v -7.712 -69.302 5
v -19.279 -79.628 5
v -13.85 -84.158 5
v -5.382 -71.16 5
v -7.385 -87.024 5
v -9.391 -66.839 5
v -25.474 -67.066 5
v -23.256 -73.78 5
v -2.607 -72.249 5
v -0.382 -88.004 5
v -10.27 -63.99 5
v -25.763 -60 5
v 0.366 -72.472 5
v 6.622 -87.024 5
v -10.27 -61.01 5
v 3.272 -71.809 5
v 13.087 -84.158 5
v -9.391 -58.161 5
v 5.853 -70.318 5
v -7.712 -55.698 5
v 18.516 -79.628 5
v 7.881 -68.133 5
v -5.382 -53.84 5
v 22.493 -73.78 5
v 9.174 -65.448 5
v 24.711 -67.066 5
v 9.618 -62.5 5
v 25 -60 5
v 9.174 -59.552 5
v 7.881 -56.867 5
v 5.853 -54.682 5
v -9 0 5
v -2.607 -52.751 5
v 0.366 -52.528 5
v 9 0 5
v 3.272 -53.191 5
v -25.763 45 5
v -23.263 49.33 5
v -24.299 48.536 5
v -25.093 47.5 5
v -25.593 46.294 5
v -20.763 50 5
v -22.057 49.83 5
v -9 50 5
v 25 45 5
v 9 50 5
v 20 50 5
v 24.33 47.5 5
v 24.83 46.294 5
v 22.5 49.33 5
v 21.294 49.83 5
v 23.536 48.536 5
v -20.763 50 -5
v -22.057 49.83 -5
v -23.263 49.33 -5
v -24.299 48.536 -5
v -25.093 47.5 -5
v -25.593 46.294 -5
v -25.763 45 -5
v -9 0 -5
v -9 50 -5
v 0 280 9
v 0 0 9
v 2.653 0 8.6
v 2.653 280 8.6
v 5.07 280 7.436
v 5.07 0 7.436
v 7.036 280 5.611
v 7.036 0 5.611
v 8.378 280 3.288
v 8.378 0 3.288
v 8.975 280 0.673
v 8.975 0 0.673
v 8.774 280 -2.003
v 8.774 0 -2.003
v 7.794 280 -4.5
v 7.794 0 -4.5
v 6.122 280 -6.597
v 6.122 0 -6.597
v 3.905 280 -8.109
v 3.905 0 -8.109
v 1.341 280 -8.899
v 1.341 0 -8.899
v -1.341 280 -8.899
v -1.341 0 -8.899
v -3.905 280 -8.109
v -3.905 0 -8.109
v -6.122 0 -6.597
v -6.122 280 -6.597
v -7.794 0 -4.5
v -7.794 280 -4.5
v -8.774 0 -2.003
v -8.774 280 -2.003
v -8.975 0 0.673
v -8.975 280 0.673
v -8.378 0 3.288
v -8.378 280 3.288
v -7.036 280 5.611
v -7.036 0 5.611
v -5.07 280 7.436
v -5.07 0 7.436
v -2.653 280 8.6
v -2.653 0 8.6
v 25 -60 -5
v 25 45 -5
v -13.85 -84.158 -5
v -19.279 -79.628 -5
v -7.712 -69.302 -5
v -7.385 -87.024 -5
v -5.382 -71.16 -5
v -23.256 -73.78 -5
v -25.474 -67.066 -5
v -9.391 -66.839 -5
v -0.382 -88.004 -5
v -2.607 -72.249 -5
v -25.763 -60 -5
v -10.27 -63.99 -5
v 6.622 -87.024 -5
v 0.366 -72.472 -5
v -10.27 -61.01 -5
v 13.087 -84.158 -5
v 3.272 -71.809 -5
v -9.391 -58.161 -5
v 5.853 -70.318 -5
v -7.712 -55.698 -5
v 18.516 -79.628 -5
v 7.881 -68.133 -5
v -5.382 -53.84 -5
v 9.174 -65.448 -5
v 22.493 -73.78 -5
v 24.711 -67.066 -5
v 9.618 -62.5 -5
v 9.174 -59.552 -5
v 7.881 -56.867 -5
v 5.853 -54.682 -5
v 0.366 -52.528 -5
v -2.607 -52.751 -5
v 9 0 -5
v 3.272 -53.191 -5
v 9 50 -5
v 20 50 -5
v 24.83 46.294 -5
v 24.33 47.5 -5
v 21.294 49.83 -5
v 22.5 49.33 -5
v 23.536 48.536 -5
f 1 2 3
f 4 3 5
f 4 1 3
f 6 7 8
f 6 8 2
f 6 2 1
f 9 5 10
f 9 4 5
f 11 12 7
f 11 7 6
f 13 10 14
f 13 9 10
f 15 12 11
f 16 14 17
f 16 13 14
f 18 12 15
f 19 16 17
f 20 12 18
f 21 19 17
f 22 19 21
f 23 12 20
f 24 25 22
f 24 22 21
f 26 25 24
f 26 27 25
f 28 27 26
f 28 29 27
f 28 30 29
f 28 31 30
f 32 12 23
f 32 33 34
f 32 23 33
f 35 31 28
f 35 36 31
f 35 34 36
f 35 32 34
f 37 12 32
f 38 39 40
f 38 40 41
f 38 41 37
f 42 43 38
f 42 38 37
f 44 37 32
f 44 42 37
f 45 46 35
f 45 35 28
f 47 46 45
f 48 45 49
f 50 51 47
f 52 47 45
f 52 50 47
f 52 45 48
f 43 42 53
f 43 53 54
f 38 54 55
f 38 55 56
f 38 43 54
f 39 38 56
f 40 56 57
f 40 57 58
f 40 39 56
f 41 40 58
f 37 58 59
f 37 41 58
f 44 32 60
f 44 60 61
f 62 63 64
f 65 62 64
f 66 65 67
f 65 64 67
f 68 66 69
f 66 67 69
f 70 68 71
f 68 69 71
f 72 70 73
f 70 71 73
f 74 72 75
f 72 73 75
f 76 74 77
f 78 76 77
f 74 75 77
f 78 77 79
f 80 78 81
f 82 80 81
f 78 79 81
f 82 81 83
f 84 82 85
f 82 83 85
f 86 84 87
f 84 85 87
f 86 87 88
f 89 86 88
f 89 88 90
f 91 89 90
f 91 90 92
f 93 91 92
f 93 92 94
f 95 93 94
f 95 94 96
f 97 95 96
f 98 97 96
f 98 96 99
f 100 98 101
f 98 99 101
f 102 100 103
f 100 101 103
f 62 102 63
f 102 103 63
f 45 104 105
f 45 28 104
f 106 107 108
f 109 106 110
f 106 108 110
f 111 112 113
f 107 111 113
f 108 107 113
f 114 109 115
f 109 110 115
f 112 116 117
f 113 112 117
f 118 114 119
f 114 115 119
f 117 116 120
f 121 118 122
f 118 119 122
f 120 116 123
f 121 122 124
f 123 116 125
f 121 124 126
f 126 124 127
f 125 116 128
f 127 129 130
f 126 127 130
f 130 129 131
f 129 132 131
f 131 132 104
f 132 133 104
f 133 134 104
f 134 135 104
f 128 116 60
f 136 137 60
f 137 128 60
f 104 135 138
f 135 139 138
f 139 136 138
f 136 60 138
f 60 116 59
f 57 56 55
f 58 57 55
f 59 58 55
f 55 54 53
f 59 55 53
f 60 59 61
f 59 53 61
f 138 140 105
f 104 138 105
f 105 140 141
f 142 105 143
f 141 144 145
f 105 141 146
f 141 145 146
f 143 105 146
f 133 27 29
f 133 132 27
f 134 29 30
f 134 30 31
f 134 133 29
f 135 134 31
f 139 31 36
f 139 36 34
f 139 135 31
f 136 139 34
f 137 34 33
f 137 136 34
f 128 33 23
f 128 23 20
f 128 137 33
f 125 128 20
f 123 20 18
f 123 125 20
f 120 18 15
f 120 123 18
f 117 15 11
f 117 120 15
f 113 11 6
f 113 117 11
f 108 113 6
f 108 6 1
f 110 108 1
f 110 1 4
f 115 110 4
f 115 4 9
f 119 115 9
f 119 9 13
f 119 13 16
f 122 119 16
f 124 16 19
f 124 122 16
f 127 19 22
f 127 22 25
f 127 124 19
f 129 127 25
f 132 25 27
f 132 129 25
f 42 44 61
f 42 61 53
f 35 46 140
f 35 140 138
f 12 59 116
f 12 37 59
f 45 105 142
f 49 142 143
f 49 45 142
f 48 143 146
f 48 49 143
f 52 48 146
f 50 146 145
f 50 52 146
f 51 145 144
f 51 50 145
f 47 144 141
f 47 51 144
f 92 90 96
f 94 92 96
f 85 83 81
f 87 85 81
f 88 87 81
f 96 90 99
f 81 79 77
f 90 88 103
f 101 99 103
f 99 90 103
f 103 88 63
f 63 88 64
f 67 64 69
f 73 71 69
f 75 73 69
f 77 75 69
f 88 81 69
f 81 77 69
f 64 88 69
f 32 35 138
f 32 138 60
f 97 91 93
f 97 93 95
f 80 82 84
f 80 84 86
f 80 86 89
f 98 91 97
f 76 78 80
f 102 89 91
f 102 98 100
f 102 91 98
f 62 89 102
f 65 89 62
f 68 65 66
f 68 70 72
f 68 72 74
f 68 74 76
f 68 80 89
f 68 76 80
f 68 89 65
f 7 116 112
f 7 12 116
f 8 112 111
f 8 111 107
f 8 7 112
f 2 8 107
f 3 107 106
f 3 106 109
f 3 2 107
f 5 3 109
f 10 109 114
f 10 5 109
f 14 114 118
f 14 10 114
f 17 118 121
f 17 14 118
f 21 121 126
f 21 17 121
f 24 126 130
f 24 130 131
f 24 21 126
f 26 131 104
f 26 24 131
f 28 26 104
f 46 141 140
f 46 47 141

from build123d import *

# Parameters (mm, degrees)
SKETCH1_R           = 9
BOSS_EXTRUDE1_DEPTH = 280
SKETCH2_R           = 10
BOSS_EXTRUDE2_DEPTH = 5


with BuildPart() as part:
    # Sketch1 → Boss-Extrude1 (new body)
    with BuildSketch(Plane(origin=(0, 0, 0), x_dir=(1, 0, 0), z_dir=(0, 1, 0))):
        with Locations(Location((0, 0, 0), (0, 0, 270))):
            Circle(SKETCH1_R)
    extrude(amount=BOSS_EXTRUDE1_DEPTH)


with BuildPart() as body_2:
    # Sketch2 → Boss-Extrude2 (new, symmetric)
    with BuildSketch(Plane.XY):
        with BuildLine():
            Line((20, 50), (9, 50))
            Line((9, 50), (9, 0))
            Line((9, 0), (-9, 0))
            Line((-9, 0), (-9, 50))
            Line((-9, 50), (-20.763054614, 50))
            ThreePointArc((-20.763054614, 50), (-24.29858852, 48.535533906), (-25.763054614, 45))
            Line((-25.763054614, 45), (-25.763054614, -60))
            ThreePointArc((-25.763054614, -60), (-0.381527307, -88.004351167), (25, -60))
            Line((25, -60), (25, 45))
            ThreePointArc((25, 45), (23.535533906, 48.535533906), (20, 50))
        make_face()
        with Locations((-0.381527307, -62.5)):
            Circle(SKETCH2_R, mode=Mode.SUBTRACT)
    extrude(amount=BOSS_EXTRUDE2_DEPTH, both=True)


solid = Compound([part.part, body_2.part])
